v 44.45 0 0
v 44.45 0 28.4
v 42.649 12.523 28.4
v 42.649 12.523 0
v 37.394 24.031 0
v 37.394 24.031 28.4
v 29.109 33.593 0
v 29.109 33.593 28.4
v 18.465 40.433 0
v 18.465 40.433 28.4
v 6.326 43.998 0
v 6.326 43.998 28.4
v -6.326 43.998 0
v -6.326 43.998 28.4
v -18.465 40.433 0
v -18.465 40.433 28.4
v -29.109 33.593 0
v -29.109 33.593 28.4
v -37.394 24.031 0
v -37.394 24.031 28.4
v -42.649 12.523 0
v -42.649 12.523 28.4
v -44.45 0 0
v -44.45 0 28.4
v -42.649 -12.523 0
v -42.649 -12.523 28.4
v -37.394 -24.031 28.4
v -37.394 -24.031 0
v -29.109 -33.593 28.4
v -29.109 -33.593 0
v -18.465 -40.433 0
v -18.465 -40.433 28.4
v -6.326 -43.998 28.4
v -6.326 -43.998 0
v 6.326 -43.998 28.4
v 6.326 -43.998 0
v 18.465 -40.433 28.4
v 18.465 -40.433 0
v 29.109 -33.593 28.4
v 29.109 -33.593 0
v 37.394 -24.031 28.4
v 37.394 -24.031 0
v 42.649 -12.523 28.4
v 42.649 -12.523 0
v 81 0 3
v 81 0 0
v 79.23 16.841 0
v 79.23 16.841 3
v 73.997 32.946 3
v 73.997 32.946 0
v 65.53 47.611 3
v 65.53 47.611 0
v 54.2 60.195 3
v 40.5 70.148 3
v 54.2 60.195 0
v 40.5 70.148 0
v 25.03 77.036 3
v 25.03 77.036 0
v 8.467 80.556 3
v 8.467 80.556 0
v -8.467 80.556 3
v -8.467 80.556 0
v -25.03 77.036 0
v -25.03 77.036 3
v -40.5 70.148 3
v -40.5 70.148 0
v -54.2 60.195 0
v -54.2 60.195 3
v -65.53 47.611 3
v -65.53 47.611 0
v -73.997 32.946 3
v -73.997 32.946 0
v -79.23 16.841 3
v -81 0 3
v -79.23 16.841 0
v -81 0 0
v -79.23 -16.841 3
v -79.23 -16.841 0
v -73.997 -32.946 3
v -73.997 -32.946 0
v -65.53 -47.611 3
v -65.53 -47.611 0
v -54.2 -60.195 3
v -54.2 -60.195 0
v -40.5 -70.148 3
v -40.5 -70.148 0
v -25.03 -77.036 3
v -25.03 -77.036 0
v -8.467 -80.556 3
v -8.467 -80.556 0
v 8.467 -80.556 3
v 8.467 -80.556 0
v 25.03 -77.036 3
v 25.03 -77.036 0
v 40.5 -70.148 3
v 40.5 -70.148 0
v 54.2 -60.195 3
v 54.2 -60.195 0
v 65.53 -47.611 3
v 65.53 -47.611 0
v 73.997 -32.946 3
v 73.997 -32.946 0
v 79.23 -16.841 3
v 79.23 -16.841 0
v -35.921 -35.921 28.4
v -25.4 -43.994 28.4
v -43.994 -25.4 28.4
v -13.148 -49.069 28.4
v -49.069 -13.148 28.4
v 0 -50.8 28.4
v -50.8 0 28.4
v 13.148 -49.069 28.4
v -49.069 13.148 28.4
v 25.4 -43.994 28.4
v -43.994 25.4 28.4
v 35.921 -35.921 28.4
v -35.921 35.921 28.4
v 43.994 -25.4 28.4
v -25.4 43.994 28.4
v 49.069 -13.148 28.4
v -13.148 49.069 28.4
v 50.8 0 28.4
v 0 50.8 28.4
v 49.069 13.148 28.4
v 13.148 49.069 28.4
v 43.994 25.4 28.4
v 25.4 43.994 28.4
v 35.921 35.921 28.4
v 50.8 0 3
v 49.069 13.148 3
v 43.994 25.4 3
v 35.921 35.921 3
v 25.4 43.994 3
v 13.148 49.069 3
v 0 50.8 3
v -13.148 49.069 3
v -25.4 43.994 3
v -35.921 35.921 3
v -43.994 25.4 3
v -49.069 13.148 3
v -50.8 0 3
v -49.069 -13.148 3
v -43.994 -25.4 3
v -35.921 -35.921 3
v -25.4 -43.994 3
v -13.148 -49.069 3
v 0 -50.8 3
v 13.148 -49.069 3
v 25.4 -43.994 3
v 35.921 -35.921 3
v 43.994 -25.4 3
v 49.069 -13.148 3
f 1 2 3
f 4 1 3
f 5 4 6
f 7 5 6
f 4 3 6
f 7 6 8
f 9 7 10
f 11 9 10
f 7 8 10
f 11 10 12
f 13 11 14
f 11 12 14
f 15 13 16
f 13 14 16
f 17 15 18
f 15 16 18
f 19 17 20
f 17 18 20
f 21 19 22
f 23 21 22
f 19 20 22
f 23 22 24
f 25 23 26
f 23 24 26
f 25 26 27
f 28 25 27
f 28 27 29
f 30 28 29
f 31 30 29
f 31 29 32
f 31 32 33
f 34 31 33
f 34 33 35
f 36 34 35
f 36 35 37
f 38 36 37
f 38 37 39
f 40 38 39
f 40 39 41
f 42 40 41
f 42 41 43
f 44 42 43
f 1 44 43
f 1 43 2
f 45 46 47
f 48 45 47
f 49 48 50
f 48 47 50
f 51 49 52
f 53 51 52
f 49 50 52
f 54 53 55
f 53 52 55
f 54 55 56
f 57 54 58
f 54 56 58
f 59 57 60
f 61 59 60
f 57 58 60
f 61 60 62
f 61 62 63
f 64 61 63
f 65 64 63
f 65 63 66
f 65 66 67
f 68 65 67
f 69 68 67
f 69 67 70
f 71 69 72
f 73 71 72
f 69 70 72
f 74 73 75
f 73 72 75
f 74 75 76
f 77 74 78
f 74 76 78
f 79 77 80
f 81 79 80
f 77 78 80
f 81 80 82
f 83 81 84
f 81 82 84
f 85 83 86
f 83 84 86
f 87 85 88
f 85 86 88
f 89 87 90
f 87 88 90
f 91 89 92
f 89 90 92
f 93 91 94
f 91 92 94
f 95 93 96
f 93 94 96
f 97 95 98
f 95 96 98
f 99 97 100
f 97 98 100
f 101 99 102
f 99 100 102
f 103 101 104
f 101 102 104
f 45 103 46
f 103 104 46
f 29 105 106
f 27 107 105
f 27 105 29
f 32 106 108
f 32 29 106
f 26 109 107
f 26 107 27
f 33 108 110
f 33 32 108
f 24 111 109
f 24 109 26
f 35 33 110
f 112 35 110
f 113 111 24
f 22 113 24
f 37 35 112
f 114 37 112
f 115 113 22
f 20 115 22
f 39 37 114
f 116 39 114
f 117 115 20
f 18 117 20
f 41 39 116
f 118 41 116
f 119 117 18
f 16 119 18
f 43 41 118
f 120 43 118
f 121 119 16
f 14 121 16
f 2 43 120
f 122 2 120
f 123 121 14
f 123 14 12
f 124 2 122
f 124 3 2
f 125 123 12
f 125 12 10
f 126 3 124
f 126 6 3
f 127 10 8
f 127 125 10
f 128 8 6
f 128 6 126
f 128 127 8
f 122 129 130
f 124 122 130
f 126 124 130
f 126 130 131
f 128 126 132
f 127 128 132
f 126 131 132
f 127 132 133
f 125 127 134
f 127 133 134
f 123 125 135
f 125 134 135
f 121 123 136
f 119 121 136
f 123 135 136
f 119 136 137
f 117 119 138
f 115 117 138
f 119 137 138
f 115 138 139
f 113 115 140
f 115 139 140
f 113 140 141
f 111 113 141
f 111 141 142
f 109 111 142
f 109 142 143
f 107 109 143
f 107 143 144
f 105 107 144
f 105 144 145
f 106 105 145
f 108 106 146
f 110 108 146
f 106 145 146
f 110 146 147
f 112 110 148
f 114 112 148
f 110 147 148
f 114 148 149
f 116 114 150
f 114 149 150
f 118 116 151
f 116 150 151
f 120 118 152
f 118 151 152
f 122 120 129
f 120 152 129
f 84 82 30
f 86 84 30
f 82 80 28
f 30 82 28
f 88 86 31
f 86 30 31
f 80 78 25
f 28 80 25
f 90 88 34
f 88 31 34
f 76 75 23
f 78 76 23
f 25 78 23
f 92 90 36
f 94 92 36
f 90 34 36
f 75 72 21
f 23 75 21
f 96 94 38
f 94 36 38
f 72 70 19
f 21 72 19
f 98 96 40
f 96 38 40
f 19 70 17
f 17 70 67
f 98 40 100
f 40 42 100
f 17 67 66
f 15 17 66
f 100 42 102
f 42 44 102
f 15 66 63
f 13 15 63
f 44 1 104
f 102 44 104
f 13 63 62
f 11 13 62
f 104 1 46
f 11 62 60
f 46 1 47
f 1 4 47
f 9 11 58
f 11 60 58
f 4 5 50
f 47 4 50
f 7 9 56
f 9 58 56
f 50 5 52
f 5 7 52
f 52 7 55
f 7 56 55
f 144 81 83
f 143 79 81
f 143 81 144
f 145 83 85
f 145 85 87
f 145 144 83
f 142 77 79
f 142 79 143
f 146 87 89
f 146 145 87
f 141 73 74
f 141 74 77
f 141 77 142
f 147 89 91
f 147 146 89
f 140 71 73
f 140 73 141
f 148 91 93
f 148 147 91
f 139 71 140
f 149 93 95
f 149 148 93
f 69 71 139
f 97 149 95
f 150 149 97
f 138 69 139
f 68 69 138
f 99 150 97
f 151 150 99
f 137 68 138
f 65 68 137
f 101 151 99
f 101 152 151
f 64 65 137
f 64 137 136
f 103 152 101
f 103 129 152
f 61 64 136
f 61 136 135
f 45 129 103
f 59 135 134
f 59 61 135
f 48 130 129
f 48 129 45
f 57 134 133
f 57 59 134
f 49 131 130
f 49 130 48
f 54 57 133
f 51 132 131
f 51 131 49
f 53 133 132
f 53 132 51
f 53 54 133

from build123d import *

# Parameters (mm, degrees)
F0_R     = 81
F1_DEPTH = 3
F2_R     = 50.8
F3_DEPTH = 25.4
F4_R     = 44.45
F5_DEPTH = 28.401


with BuildPart() as f1:
    # F0 (on Top) → F1 (new body)
    with BuildSketch(Plane.XY):
        Circle(F0_R)
    extrude(amount=F1_DEPTH)

    # F2 (on face) → F3 (join)
    with BuildSketch(Plane.XY.offset(3)):
        Circle(F2_R)
    extrude(amount=F3_DEPTH)

    # F4 (on face) → F5 (cut, through all)
    with BuildSketch(Plane.XY.offset(28.4)):
        Circle(F4_R)
    extrude(amount=-F5_DEPTH, mode=Mode.SUBTRACT)


solid = f1.part
